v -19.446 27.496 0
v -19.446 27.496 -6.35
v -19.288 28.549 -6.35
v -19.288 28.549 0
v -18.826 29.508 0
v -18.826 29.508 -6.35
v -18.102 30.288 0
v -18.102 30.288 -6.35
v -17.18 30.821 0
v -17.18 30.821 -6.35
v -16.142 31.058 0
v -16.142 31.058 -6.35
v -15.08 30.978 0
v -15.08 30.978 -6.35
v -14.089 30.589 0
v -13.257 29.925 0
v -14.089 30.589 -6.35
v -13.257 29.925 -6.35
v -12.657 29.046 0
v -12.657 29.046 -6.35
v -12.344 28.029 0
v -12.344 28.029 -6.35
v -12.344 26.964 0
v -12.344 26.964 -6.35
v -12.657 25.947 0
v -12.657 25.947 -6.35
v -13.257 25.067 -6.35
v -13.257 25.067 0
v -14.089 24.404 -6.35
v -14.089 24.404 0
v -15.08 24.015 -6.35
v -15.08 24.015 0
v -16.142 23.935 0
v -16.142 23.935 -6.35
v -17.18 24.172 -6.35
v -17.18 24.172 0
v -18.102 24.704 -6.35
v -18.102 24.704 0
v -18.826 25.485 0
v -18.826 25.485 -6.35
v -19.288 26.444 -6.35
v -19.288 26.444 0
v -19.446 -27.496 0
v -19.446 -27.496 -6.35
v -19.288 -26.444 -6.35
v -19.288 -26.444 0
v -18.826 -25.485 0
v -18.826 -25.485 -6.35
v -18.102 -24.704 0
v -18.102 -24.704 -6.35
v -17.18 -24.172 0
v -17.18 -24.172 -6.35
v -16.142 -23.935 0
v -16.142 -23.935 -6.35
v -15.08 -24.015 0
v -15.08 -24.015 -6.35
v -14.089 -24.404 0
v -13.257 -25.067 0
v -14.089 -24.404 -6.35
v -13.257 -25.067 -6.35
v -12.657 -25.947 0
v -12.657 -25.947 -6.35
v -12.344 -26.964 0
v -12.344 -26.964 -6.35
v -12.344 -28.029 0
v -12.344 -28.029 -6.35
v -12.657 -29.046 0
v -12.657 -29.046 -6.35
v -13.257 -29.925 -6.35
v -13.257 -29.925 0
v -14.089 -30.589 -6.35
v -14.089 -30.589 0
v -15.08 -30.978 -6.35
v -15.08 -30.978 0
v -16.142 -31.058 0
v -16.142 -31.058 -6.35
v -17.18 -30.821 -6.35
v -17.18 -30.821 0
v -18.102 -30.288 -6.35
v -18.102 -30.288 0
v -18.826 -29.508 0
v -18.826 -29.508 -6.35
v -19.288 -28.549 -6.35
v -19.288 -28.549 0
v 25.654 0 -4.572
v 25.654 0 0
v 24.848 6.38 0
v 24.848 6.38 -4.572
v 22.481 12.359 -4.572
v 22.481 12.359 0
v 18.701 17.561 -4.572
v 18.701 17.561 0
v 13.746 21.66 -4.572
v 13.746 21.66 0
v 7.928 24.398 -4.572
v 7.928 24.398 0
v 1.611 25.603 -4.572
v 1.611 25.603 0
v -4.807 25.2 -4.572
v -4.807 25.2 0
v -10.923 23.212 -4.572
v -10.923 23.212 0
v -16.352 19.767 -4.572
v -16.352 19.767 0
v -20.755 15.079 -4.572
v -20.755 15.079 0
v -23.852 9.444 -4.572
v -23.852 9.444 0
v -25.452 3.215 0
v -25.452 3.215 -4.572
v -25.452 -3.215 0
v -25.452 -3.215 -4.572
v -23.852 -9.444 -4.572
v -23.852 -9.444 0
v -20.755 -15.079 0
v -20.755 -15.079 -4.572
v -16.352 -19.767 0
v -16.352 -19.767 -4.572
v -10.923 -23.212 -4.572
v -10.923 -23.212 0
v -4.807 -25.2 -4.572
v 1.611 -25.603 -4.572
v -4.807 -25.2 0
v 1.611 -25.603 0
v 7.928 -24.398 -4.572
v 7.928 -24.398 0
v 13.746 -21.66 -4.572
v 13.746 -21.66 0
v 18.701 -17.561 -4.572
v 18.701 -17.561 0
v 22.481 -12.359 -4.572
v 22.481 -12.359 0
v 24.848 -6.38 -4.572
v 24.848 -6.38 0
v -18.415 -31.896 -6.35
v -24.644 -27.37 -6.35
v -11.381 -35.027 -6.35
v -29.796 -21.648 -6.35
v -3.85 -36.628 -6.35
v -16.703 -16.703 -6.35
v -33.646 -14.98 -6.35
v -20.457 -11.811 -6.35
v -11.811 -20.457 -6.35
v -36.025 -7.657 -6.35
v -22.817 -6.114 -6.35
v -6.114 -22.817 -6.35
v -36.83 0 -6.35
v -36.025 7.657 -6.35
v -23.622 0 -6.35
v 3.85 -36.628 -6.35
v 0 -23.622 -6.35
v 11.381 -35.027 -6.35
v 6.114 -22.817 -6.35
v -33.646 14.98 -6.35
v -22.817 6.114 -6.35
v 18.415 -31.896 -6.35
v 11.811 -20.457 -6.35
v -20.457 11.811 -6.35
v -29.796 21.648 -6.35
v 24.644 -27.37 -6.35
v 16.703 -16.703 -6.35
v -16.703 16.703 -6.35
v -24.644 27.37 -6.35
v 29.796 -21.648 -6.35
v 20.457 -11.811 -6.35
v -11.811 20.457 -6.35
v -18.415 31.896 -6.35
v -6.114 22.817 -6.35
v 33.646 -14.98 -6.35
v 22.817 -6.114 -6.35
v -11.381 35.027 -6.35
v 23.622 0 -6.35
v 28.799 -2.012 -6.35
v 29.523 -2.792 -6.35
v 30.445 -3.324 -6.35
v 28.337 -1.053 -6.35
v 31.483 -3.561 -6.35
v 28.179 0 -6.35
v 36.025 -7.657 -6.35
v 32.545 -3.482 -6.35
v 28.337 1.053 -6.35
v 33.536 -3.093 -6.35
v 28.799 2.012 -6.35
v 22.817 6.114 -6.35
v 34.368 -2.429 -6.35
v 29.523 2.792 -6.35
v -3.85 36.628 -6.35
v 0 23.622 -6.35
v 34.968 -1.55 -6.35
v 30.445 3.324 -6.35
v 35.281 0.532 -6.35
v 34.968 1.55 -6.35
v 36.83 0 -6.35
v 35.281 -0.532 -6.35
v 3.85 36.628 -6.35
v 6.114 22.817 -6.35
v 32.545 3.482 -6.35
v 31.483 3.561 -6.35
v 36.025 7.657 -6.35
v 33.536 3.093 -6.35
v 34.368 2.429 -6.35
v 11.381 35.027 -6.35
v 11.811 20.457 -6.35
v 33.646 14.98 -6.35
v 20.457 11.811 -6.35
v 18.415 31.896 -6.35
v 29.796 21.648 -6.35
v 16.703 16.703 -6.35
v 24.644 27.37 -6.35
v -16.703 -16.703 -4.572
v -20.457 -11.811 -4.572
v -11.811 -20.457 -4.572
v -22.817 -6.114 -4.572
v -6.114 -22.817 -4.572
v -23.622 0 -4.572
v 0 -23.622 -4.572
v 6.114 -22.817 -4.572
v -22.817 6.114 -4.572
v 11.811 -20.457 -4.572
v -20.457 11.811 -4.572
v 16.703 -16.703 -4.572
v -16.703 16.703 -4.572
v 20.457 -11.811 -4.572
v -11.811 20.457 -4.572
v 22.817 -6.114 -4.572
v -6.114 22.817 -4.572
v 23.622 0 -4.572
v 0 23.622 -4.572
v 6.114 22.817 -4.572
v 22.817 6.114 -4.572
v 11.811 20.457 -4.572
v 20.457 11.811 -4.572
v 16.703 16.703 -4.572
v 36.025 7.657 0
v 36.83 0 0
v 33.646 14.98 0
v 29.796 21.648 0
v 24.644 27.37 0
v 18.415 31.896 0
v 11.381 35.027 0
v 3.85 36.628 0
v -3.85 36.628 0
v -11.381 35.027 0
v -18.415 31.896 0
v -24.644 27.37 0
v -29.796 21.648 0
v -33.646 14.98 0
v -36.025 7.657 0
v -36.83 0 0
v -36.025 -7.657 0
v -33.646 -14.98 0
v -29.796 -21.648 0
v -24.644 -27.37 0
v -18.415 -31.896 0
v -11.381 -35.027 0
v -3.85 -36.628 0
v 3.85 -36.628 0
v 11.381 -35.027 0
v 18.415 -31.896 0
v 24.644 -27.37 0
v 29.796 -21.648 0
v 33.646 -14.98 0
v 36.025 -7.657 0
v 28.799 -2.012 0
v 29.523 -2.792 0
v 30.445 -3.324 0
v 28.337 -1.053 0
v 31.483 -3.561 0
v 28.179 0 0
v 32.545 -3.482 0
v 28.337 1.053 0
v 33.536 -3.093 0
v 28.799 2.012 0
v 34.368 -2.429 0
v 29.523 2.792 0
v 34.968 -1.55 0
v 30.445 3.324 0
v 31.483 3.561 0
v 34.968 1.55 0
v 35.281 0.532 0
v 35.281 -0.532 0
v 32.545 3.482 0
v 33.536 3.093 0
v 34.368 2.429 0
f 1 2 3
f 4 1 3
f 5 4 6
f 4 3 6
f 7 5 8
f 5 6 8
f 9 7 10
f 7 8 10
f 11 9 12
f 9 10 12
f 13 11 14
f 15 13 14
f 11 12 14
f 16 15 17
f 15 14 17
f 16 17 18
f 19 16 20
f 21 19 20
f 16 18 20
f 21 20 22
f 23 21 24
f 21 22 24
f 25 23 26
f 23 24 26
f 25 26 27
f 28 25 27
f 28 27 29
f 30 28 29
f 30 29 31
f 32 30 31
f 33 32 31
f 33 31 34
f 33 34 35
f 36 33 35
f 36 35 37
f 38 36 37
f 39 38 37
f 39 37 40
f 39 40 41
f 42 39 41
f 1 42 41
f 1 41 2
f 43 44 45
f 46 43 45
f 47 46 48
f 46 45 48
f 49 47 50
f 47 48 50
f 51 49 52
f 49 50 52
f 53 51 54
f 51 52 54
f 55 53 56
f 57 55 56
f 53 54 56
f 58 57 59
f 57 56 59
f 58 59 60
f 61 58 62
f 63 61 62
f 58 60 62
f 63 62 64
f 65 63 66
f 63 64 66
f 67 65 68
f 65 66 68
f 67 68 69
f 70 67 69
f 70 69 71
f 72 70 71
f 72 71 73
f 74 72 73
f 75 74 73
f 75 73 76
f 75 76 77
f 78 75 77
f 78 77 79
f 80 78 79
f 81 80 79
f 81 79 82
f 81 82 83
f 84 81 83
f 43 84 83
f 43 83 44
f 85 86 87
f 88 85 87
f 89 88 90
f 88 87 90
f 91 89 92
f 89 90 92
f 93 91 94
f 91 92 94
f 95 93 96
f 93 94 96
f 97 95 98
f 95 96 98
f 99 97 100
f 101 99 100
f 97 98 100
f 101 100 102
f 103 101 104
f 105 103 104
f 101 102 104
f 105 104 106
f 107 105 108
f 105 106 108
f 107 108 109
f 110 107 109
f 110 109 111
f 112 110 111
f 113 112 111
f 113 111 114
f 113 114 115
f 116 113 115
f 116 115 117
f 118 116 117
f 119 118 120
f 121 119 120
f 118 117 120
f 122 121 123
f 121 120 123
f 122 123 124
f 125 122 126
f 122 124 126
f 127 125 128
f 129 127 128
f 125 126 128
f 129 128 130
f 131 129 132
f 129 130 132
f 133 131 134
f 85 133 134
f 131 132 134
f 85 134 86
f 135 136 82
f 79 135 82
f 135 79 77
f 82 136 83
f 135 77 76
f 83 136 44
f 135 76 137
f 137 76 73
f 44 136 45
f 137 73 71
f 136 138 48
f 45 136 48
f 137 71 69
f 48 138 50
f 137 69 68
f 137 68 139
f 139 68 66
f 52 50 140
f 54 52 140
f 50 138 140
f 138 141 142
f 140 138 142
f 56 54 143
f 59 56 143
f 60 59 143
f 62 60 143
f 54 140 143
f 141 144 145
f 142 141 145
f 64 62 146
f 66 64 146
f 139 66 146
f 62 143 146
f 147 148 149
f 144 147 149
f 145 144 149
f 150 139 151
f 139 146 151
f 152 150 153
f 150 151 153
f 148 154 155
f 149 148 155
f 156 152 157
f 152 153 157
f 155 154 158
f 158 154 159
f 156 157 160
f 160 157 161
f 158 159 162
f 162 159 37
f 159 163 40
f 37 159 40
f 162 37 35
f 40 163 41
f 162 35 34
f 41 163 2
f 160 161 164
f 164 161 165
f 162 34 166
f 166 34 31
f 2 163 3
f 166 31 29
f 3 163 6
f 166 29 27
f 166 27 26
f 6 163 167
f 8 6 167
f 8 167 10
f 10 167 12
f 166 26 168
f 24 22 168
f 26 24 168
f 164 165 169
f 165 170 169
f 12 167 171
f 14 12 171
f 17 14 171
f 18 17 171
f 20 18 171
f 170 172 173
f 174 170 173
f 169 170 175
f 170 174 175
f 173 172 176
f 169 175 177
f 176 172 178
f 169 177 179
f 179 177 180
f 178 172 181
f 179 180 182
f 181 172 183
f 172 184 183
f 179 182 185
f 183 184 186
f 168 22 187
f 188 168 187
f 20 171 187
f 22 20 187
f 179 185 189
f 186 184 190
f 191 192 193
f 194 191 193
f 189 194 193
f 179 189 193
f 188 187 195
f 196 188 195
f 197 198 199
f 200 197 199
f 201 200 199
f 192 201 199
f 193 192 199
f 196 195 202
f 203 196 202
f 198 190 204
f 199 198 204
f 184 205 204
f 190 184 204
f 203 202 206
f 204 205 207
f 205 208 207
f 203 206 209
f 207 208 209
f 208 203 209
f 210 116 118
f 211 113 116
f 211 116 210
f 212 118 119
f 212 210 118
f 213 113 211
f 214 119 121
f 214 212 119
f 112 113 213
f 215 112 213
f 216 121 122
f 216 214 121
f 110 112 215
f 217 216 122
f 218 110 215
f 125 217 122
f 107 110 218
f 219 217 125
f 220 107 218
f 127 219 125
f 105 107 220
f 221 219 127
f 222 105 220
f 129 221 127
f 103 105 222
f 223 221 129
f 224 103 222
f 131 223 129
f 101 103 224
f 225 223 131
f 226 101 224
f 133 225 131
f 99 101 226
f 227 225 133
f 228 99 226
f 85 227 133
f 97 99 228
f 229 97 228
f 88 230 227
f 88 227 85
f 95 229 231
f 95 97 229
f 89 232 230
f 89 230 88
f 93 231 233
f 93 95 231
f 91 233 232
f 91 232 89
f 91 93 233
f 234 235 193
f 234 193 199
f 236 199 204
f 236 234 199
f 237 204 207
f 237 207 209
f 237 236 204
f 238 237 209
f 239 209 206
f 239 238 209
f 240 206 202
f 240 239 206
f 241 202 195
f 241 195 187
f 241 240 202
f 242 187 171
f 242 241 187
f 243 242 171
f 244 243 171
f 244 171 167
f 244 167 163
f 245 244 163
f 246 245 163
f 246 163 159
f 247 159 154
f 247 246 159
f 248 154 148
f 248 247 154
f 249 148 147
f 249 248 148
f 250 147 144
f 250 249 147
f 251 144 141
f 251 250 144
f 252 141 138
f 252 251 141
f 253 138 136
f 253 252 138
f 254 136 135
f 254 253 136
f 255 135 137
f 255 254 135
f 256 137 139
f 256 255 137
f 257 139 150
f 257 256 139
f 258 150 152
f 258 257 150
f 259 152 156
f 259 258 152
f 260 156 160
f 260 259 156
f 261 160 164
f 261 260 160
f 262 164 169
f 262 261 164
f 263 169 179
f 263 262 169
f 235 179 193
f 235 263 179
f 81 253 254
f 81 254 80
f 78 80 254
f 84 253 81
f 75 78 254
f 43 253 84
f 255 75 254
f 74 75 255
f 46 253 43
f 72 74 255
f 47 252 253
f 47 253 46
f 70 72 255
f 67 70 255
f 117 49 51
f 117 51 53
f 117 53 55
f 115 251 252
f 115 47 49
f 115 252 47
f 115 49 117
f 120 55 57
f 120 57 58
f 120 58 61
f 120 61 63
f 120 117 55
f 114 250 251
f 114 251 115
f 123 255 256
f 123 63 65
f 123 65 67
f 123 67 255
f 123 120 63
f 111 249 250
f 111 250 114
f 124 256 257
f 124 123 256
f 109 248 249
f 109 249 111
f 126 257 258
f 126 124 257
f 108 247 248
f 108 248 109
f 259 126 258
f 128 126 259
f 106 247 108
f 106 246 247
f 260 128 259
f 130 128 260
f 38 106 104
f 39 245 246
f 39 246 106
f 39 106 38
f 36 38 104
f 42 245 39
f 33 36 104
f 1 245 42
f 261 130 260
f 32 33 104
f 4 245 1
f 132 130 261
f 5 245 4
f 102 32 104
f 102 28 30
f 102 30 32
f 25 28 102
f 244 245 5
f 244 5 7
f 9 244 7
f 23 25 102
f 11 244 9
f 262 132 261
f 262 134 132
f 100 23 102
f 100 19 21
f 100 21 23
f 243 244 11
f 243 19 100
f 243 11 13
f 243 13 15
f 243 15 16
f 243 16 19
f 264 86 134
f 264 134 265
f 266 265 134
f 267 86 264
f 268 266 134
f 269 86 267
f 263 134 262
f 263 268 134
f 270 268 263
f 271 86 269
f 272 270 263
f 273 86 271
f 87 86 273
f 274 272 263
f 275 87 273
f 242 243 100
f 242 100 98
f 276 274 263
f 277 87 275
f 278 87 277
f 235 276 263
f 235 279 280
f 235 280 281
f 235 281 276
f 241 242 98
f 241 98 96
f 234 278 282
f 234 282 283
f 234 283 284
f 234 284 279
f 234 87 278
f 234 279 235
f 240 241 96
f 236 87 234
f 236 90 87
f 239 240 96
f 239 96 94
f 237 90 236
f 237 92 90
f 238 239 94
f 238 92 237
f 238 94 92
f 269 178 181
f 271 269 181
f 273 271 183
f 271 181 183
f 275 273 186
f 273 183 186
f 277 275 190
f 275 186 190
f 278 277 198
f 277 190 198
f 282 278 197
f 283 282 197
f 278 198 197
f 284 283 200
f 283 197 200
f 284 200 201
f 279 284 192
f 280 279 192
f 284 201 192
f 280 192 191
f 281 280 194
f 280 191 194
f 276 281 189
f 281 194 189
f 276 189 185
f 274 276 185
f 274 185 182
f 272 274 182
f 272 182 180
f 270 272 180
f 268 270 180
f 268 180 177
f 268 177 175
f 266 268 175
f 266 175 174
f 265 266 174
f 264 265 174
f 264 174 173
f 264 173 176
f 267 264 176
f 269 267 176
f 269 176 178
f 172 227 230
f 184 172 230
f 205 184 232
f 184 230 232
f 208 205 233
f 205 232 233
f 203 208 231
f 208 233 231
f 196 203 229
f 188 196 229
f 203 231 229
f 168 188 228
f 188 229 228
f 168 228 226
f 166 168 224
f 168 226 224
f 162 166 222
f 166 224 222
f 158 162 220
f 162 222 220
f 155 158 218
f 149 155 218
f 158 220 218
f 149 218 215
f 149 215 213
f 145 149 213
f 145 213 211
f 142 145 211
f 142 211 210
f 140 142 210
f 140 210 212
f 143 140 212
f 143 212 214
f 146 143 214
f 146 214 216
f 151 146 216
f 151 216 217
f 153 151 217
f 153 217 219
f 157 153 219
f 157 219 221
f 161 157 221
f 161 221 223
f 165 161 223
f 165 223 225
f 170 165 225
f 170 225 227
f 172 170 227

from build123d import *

# Parameters (mm, degrees)
SKETCH_R                = 36.83
SKETCH_R_2              = 23.622
BOSS_EXTRUDE1_DEPTH     = 6.35
SKETCH1_R               = 25.654
CUT_EXTRUDE1_DEPTH      = 4.572
F_1_4_CLEARANCE_HOLE1_D = 7.14248


with BuildPart() as part:
    # Sketch → Boss-Extrude1 (new body)
    with BuildSketch(Plane.XY):
        Circle(SKETCH_R)
        Circle(SKETCH_R_2, mode=Mode.SUBTRACT)
    extrude(amount=-BOSS_EXTRUDE1_DEPTH)

    # Sketch1 → Cut-Extrude1 (cut)
    with BuildSketch(Plane.XY):
        Circle(SKETCH1_R)
    extrude(amount=-CUT_EXTRUDE1_DEPTH, mode=Mode.SUBTRACT)

    # 1/4 Clearance Hole1 (through all)
    with Locations(Plane.XY):
        with Locations((31.75, 0), (-15.875, -27.49630657), (-15.875, 27.49630657)):
            Hole(F_1_4_CLEARANCE_HOLE1_D / 2)


solid = part.part
